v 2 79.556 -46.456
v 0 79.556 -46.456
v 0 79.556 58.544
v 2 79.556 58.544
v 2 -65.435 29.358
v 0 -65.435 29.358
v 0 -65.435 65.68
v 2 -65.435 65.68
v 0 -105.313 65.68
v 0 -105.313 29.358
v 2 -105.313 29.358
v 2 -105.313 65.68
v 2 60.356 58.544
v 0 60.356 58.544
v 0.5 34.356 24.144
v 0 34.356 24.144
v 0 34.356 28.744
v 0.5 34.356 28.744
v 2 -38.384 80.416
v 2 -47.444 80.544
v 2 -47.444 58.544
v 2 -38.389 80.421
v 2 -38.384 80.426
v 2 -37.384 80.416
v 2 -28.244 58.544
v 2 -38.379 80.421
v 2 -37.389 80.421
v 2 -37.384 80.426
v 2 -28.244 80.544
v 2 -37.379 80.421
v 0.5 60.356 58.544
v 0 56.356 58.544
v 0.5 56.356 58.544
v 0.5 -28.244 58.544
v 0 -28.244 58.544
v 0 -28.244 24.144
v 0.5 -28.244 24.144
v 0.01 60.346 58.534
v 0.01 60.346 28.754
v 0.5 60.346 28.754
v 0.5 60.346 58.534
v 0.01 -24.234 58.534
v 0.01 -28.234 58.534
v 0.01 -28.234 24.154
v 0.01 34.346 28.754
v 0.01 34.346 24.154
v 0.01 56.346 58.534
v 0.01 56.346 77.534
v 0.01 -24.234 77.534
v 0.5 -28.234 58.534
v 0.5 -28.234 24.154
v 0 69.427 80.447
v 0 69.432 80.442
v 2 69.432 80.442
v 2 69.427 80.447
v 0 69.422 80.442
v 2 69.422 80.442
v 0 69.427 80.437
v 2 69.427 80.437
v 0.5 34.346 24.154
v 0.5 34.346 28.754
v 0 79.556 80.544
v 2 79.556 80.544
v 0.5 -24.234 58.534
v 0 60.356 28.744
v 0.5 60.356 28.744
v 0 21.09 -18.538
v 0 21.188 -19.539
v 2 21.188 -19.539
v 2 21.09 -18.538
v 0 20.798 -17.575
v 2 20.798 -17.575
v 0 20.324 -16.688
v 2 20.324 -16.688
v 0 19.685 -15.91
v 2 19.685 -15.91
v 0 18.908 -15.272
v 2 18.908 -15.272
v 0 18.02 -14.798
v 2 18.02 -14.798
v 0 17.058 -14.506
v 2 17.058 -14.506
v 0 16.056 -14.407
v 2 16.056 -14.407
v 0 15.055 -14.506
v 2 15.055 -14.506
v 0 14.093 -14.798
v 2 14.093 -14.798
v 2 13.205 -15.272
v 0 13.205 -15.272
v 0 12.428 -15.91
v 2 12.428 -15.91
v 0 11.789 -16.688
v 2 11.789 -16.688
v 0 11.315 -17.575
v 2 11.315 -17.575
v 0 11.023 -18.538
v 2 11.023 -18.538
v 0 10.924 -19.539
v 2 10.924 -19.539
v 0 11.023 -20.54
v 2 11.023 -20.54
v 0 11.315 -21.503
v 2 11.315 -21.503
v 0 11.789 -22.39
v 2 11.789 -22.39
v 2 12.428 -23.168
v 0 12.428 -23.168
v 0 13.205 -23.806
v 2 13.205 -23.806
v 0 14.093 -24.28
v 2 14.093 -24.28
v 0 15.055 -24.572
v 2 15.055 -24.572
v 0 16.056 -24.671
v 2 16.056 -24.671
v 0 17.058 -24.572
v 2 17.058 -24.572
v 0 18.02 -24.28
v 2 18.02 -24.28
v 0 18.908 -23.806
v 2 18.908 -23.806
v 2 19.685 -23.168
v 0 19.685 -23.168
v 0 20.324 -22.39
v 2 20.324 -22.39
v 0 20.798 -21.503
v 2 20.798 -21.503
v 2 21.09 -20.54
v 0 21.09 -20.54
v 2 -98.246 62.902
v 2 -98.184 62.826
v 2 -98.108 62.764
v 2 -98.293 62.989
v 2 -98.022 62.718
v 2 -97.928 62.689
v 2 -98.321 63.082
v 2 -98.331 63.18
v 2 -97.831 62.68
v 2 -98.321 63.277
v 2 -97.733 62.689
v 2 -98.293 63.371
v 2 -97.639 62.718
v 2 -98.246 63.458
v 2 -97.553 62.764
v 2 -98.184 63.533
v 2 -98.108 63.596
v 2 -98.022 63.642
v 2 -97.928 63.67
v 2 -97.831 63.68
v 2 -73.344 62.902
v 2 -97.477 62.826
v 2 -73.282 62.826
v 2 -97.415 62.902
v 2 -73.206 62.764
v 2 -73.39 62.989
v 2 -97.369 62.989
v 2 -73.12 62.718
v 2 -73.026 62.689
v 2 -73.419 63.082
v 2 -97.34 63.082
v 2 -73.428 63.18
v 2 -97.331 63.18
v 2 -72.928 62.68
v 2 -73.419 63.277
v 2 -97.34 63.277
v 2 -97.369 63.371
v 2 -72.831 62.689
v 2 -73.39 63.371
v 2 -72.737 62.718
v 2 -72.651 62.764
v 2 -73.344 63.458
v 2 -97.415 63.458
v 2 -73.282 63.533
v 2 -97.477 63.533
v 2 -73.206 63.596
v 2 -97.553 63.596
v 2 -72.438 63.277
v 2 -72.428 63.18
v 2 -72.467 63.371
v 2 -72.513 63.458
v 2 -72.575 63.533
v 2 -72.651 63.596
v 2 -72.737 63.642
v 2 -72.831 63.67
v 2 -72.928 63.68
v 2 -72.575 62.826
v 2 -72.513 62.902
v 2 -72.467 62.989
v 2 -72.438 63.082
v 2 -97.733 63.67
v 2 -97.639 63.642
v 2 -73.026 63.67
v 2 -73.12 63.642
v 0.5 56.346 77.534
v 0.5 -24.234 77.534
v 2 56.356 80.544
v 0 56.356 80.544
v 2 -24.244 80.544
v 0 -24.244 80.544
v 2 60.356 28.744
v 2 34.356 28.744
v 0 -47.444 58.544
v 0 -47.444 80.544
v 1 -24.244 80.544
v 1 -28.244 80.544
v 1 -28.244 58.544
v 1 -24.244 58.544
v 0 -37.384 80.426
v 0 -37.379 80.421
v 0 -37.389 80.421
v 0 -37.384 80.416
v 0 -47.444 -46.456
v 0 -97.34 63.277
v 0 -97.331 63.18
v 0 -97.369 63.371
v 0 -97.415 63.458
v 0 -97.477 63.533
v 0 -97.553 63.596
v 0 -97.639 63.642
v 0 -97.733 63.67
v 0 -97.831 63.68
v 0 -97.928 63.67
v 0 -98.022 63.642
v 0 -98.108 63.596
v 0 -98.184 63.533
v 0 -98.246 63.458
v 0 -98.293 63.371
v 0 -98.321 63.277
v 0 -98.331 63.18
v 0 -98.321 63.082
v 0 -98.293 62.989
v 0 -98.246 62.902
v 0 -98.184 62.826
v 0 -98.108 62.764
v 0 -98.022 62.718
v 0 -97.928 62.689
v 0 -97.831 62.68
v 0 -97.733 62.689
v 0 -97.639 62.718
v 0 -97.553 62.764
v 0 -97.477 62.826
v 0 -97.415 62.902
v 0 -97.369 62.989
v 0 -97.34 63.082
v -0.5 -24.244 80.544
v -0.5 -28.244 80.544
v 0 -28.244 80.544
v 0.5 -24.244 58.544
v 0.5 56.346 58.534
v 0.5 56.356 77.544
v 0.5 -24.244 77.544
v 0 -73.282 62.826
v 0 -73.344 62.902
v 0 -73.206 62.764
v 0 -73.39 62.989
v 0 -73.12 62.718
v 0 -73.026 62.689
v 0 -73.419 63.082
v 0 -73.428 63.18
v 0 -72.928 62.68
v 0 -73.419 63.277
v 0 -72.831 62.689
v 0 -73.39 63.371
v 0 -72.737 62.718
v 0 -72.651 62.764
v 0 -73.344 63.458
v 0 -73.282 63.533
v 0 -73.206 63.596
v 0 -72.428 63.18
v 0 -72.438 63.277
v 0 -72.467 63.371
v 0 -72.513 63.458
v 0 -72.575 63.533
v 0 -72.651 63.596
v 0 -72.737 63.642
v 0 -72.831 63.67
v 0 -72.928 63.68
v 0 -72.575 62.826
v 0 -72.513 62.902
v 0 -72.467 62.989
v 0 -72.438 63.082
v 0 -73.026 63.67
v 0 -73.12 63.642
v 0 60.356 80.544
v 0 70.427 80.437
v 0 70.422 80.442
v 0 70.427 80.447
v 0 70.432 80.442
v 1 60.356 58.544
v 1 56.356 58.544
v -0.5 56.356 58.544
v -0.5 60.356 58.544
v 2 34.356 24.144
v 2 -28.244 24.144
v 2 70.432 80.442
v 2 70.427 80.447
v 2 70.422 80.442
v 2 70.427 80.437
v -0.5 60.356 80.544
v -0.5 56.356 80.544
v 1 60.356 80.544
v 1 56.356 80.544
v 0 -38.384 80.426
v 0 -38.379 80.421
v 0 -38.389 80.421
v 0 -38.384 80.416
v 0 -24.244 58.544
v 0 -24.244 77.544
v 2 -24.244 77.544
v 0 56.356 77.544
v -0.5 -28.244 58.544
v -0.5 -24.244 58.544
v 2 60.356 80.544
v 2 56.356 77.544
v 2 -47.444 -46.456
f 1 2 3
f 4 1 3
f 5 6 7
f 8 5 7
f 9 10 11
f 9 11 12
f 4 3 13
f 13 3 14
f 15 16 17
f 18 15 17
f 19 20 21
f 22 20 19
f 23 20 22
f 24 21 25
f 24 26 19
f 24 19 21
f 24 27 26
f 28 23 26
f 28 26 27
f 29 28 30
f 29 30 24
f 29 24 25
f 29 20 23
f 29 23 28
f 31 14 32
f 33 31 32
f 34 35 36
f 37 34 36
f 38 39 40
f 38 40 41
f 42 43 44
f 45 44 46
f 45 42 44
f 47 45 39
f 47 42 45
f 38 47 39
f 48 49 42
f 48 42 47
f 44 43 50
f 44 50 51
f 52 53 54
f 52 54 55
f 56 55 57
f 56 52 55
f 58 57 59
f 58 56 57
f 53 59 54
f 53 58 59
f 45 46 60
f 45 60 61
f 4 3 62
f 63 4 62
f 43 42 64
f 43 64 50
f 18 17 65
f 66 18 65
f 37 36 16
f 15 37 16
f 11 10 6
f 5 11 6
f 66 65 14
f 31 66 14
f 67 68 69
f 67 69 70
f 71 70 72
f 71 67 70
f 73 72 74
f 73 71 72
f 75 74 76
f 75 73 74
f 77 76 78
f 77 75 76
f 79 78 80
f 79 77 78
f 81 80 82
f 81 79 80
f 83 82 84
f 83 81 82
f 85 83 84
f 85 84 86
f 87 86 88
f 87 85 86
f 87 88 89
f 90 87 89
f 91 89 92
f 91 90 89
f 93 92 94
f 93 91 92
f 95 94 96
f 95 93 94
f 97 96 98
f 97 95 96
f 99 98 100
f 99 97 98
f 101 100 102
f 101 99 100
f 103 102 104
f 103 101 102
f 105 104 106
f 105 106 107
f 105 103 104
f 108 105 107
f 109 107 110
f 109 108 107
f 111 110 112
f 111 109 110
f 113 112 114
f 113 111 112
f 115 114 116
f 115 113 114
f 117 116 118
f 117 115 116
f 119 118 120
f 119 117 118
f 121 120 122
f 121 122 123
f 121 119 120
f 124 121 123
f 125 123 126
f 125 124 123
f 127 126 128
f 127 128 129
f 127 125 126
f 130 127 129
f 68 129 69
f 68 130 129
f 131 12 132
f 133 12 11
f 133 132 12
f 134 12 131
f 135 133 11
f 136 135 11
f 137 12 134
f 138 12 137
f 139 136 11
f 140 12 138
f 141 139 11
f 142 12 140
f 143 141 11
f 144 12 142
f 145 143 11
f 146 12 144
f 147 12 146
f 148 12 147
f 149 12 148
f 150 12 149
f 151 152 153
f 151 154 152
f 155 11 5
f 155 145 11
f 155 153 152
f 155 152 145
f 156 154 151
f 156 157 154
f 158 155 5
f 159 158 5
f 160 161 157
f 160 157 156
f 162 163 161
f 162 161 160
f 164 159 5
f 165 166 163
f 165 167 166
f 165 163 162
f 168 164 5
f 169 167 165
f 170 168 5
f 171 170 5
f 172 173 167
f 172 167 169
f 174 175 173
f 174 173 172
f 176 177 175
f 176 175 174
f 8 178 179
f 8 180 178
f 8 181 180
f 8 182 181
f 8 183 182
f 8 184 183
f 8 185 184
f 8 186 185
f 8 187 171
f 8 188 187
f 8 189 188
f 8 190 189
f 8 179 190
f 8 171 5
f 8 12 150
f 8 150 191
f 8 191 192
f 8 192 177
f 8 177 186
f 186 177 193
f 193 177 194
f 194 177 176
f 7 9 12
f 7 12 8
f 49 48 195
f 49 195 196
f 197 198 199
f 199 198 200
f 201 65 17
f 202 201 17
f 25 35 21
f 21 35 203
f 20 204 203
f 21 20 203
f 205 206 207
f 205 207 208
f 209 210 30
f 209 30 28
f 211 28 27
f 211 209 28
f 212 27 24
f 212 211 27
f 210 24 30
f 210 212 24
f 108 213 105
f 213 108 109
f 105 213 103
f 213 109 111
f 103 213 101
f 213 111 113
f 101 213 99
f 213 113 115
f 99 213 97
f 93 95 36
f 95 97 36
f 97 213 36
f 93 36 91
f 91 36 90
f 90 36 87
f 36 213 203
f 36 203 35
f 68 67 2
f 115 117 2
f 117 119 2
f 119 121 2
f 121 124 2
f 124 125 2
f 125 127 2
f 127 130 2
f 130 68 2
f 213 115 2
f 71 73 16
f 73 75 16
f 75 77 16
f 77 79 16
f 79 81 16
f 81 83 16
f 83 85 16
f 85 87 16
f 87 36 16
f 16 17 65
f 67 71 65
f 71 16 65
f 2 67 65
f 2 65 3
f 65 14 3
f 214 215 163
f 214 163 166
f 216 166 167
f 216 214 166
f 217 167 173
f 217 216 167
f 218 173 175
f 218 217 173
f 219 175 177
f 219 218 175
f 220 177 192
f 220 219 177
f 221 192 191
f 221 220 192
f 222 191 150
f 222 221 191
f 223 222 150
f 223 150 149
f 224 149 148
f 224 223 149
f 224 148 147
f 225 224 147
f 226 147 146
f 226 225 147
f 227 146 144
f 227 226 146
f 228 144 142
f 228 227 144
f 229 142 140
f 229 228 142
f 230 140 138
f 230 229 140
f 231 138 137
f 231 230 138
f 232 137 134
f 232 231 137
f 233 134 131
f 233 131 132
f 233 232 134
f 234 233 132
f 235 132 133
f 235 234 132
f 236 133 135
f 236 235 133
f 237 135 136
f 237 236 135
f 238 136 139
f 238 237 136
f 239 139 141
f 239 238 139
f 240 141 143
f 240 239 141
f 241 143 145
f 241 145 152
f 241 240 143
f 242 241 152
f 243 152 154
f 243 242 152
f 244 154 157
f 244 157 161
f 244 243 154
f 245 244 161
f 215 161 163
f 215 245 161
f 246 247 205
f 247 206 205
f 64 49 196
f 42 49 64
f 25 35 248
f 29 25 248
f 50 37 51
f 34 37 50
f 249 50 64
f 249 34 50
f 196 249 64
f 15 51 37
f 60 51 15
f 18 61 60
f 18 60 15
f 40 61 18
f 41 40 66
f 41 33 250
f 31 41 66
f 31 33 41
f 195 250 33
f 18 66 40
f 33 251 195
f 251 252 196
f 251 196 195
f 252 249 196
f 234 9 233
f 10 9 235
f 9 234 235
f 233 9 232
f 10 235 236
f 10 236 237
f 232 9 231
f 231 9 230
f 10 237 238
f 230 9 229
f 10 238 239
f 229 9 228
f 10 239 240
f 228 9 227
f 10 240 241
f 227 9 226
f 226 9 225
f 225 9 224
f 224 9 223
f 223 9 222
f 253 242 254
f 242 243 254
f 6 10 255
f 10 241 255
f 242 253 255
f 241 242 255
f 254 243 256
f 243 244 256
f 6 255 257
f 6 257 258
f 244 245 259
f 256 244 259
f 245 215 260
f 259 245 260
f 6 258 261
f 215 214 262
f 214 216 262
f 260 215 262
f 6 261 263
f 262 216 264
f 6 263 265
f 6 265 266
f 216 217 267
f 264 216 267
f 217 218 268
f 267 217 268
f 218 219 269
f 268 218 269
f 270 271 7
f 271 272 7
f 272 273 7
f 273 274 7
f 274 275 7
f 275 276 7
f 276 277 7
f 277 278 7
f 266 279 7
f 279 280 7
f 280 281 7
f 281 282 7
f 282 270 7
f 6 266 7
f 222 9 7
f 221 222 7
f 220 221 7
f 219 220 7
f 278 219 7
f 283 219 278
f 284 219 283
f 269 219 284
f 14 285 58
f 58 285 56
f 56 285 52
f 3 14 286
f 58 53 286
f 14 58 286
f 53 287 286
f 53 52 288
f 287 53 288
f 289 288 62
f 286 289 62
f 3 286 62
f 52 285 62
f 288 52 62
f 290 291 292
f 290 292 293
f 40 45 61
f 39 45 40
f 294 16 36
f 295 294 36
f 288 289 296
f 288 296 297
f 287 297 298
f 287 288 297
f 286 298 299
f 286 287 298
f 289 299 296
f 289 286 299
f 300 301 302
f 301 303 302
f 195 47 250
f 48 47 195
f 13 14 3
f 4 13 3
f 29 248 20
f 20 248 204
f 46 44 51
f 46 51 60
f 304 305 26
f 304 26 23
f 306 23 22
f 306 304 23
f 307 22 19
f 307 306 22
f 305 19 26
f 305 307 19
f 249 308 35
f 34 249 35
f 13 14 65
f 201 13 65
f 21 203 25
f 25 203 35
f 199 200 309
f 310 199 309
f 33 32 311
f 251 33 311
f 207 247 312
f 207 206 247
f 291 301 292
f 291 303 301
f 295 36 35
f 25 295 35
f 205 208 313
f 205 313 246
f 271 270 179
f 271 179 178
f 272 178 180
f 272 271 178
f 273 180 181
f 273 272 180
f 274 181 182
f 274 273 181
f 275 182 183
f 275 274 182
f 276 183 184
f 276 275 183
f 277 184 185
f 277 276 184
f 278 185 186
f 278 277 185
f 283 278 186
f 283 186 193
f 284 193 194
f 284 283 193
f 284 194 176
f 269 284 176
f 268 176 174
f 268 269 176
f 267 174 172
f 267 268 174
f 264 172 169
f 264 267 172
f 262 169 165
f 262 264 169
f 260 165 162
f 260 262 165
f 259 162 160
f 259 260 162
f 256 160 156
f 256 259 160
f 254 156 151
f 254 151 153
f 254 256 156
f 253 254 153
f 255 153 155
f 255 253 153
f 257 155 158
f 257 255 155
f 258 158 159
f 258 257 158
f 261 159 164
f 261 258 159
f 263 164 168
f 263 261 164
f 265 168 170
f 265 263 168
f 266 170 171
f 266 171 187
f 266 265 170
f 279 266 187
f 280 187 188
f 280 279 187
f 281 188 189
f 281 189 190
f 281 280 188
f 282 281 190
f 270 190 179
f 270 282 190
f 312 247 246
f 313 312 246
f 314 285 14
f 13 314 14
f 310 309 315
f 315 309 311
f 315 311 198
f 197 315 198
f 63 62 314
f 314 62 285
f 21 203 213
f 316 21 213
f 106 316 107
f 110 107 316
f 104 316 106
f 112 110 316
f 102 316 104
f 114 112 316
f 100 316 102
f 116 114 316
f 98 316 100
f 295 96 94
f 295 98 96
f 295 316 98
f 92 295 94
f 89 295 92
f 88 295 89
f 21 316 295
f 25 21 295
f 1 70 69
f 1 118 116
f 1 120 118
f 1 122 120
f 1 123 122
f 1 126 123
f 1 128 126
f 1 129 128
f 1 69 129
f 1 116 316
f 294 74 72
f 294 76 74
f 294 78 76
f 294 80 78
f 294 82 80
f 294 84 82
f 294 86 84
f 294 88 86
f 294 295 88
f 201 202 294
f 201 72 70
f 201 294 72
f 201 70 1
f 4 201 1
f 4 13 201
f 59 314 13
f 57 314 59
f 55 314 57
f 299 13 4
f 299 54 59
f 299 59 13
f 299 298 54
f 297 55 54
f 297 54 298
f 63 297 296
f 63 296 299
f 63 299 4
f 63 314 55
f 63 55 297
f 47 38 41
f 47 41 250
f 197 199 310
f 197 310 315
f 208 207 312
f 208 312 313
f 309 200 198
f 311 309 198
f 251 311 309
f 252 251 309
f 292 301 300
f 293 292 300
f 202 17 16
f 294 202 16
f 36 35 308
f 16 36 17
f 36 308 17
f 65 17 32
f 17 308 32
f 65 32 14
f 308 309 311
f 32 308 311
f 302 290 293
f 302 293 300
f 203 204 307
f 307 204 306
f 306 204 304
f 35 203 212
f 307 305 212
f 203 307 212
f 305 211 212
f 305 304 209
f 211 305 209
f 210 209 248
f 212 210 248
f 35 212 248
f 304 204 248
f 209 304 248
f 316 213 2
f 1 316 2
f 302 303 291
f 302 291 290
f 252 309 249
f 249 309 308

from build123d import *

# Parameters (mm, degrees)
F1_W          = 39.878
F1_H          = 36.322
F1_R          = 0.5
F2_DEPTH      = 2
F4_DEPTH      = 0.5
F5_T          = -0.01
F0_R          = 5.1320105677
F6_DEPTH      = 2
F0_R_2        = 0.005
F7_DEPTH      = 2
F0_W          = 4
F0_H          = 3
F0_H_2        = 19
F8_DEPTH      = 1
F8_DEPTH_BACK = 0.5


# Not quite as in the source:
# - the program builds the solid bodies; features that only make, move or delete a surface that nothing else refers to are left out


with BuildPart() as f2:
    # F1 (on Right) → F2 (new body)
    with BuildSketch(Plane.YZ):
        with Locations((-85.3744426475, 47.5188505783)):
            Rectangle(F1_W, F1_H)
        with Locations((-97.8306755424, 63.1798505783)):
            Circle(F1_R, mode=Mode.SUBTRACT)
        with Locations((-72.9284426475, 63.1798505783)):
            Circle(F1_R, mode=Mode.SUBTRACT)
    extrude(amount=F2_DEPTH)


with BuildPart() as f4:
    # F0 (on Right) → F4 (new body)
    with BuildSketch(Plane.YZ):
        Polygon((-24.2435368776, 58.5436199023), (-28.2435368776, 58.5436199023), (-28.2435368776, 24.1436199023), (34.3564631224, 24.1436199023), (34.3564631224, 28.7436199023), (34.3564631224, 77.5436199023), (-24.2435368776, 77.5436199023), align=None)
        Polygon((56.3564631224, 58.5436199023), (56.3564631224, 77.5436199023), (34.3564631224, 77.5436199023), (34.3564631224, 28.7436199023), (60.3564631224, 28.7436199023), (60.3564631224, 58.5436199023), align=None)
    extrude(amount=F4_DEPTH)

    # F5
    f5_openings = [f4.faces().sort_by_distance(p)[0] for p in [
        (0.5, 15.21705, 50.911751),
    ]]
    offset(amount=F5_T, openings=f5_openings, kind=Kind.INTERSECTION)


with BuildPart() as f6:
    # F0 (on Right) → F6 (new body)
    with BuildSketch(Plane.YZ):
        Polygon((-28.2435368776, 58.5436199023), (-47.4435368776, 58.5436199023), (-47.4435368776, -46.4563800977), (79.5564631224, -46.4563800977), (79.5564631224, 58.5436199023), (60.3564631224, 58.5436199023), (60.3564631224, 28.7436199023), (34.3564631224, 28.7436199023), (34.3564631224, 24.1436199023), (-28.2435368776, 24.1436199023), align=None)
        with Locations((16.0564631224, -19.5390637964)):
            Circle(F0_R, mode=Mode.SUBTRACT)
    extrude(amount=F6_DEPTH)


with BuildPart() as f7:
    # F0 (on Right) → F7 (new body)
    with BuildSketch(Plane.YZ):
        Polygon((-28.2435368776, 80.5436199023), (-47.4435368776, 80.5436199023), (-47.4435368776, 58.5436199023), (-28.2435368776, 58.5436199023), (-28.2435368776, 77.5436199023), align=None)
        with Locations((-38.3837649822, 80.4212242365)):
            Circle(F0_R_2, mode=Mode.SUBTRACT)
        with Locations((-37.3837649822, 80.4212242365)):
            Circle(F0_R_2, mode=Mode.SUBTRACT)
    extrude(amount=F7_DEPTH)


with BuildPart() as f7b:
    # F0 (on Right) → F7, piece 2 (new body)
    with BuildSketch(Plane.YZ):
        Polygon((79.5564631224, 80.5436199023), (60.3564631224, 80.5436199023), (60.3564631224, 77.5436199023), (60.3564631224, 58.5436199023), (79.5564631224, 58.5436199023), align=None)
        with Locations((69.4271420836, 80.4418772459)):
            Circle(F0_R_2, mode=Mode.SUBTRACT)
        with Locations((70.4271420836, 80.4418772459)):
            Circle(F0_R_2, mode=Mode.SUBTRACT)
    extrude(amount=F7_DEPTH)


with BuildPart() as f7c:
    # F0 (on Right) → F7, piece 3 (new body)
    with BuildSketch(Plane.YZ):
        Polygon((56.3564631224, 80.5436199023), (-24.2435368776, 80.5436199023), (-24.2435368776, 77.5436199023), (34.3564631224, 77.5436199023), (56.3564631224, 77.5436199023), align=None)
    extrude(amount=F7_DEPTH)


with BuildPart() as f8:
    # F0 (on Right) → F8 (new body, two sides)
    with BuildSketch(Plane.YZ) as f8_sk:
        with Locations((-26.2435368776, 79.0436199023)):
            Rectangle(F0_W, F0_H)
        with Locations((-26.2435368776, 68.0436199023)):
            Rectangle(F0_W, F0_H_2)
    extrude(amount=F8_DEPTH)
    extrude(f8_sk.sketch, amount=-F8_DEPTH_BACK)


with BuildPart() as f8b:
    # F0 (on Right) → F8, piece 2 (new body, two sides)
    with BuildSketch(Plane.YZ) as f8_2_sk:
        with Locations((58.3564631224, 79.0436199023)):
            Rectangle(F0_W, F0_H)
        with Locations((58.3564631224, 68.0436199023)):
            Rectangle(F0_W, F0_H_2)
    extrude(amount=F8_DEPTH)
    extrude(f8_2_sk.sketch, amount=-F8_DEPTH_BACK)


solid = Compound([f2.part, f4.part, f6.part, f7.part, f7b.part, f7c.part, f8.part, f8b.part])
